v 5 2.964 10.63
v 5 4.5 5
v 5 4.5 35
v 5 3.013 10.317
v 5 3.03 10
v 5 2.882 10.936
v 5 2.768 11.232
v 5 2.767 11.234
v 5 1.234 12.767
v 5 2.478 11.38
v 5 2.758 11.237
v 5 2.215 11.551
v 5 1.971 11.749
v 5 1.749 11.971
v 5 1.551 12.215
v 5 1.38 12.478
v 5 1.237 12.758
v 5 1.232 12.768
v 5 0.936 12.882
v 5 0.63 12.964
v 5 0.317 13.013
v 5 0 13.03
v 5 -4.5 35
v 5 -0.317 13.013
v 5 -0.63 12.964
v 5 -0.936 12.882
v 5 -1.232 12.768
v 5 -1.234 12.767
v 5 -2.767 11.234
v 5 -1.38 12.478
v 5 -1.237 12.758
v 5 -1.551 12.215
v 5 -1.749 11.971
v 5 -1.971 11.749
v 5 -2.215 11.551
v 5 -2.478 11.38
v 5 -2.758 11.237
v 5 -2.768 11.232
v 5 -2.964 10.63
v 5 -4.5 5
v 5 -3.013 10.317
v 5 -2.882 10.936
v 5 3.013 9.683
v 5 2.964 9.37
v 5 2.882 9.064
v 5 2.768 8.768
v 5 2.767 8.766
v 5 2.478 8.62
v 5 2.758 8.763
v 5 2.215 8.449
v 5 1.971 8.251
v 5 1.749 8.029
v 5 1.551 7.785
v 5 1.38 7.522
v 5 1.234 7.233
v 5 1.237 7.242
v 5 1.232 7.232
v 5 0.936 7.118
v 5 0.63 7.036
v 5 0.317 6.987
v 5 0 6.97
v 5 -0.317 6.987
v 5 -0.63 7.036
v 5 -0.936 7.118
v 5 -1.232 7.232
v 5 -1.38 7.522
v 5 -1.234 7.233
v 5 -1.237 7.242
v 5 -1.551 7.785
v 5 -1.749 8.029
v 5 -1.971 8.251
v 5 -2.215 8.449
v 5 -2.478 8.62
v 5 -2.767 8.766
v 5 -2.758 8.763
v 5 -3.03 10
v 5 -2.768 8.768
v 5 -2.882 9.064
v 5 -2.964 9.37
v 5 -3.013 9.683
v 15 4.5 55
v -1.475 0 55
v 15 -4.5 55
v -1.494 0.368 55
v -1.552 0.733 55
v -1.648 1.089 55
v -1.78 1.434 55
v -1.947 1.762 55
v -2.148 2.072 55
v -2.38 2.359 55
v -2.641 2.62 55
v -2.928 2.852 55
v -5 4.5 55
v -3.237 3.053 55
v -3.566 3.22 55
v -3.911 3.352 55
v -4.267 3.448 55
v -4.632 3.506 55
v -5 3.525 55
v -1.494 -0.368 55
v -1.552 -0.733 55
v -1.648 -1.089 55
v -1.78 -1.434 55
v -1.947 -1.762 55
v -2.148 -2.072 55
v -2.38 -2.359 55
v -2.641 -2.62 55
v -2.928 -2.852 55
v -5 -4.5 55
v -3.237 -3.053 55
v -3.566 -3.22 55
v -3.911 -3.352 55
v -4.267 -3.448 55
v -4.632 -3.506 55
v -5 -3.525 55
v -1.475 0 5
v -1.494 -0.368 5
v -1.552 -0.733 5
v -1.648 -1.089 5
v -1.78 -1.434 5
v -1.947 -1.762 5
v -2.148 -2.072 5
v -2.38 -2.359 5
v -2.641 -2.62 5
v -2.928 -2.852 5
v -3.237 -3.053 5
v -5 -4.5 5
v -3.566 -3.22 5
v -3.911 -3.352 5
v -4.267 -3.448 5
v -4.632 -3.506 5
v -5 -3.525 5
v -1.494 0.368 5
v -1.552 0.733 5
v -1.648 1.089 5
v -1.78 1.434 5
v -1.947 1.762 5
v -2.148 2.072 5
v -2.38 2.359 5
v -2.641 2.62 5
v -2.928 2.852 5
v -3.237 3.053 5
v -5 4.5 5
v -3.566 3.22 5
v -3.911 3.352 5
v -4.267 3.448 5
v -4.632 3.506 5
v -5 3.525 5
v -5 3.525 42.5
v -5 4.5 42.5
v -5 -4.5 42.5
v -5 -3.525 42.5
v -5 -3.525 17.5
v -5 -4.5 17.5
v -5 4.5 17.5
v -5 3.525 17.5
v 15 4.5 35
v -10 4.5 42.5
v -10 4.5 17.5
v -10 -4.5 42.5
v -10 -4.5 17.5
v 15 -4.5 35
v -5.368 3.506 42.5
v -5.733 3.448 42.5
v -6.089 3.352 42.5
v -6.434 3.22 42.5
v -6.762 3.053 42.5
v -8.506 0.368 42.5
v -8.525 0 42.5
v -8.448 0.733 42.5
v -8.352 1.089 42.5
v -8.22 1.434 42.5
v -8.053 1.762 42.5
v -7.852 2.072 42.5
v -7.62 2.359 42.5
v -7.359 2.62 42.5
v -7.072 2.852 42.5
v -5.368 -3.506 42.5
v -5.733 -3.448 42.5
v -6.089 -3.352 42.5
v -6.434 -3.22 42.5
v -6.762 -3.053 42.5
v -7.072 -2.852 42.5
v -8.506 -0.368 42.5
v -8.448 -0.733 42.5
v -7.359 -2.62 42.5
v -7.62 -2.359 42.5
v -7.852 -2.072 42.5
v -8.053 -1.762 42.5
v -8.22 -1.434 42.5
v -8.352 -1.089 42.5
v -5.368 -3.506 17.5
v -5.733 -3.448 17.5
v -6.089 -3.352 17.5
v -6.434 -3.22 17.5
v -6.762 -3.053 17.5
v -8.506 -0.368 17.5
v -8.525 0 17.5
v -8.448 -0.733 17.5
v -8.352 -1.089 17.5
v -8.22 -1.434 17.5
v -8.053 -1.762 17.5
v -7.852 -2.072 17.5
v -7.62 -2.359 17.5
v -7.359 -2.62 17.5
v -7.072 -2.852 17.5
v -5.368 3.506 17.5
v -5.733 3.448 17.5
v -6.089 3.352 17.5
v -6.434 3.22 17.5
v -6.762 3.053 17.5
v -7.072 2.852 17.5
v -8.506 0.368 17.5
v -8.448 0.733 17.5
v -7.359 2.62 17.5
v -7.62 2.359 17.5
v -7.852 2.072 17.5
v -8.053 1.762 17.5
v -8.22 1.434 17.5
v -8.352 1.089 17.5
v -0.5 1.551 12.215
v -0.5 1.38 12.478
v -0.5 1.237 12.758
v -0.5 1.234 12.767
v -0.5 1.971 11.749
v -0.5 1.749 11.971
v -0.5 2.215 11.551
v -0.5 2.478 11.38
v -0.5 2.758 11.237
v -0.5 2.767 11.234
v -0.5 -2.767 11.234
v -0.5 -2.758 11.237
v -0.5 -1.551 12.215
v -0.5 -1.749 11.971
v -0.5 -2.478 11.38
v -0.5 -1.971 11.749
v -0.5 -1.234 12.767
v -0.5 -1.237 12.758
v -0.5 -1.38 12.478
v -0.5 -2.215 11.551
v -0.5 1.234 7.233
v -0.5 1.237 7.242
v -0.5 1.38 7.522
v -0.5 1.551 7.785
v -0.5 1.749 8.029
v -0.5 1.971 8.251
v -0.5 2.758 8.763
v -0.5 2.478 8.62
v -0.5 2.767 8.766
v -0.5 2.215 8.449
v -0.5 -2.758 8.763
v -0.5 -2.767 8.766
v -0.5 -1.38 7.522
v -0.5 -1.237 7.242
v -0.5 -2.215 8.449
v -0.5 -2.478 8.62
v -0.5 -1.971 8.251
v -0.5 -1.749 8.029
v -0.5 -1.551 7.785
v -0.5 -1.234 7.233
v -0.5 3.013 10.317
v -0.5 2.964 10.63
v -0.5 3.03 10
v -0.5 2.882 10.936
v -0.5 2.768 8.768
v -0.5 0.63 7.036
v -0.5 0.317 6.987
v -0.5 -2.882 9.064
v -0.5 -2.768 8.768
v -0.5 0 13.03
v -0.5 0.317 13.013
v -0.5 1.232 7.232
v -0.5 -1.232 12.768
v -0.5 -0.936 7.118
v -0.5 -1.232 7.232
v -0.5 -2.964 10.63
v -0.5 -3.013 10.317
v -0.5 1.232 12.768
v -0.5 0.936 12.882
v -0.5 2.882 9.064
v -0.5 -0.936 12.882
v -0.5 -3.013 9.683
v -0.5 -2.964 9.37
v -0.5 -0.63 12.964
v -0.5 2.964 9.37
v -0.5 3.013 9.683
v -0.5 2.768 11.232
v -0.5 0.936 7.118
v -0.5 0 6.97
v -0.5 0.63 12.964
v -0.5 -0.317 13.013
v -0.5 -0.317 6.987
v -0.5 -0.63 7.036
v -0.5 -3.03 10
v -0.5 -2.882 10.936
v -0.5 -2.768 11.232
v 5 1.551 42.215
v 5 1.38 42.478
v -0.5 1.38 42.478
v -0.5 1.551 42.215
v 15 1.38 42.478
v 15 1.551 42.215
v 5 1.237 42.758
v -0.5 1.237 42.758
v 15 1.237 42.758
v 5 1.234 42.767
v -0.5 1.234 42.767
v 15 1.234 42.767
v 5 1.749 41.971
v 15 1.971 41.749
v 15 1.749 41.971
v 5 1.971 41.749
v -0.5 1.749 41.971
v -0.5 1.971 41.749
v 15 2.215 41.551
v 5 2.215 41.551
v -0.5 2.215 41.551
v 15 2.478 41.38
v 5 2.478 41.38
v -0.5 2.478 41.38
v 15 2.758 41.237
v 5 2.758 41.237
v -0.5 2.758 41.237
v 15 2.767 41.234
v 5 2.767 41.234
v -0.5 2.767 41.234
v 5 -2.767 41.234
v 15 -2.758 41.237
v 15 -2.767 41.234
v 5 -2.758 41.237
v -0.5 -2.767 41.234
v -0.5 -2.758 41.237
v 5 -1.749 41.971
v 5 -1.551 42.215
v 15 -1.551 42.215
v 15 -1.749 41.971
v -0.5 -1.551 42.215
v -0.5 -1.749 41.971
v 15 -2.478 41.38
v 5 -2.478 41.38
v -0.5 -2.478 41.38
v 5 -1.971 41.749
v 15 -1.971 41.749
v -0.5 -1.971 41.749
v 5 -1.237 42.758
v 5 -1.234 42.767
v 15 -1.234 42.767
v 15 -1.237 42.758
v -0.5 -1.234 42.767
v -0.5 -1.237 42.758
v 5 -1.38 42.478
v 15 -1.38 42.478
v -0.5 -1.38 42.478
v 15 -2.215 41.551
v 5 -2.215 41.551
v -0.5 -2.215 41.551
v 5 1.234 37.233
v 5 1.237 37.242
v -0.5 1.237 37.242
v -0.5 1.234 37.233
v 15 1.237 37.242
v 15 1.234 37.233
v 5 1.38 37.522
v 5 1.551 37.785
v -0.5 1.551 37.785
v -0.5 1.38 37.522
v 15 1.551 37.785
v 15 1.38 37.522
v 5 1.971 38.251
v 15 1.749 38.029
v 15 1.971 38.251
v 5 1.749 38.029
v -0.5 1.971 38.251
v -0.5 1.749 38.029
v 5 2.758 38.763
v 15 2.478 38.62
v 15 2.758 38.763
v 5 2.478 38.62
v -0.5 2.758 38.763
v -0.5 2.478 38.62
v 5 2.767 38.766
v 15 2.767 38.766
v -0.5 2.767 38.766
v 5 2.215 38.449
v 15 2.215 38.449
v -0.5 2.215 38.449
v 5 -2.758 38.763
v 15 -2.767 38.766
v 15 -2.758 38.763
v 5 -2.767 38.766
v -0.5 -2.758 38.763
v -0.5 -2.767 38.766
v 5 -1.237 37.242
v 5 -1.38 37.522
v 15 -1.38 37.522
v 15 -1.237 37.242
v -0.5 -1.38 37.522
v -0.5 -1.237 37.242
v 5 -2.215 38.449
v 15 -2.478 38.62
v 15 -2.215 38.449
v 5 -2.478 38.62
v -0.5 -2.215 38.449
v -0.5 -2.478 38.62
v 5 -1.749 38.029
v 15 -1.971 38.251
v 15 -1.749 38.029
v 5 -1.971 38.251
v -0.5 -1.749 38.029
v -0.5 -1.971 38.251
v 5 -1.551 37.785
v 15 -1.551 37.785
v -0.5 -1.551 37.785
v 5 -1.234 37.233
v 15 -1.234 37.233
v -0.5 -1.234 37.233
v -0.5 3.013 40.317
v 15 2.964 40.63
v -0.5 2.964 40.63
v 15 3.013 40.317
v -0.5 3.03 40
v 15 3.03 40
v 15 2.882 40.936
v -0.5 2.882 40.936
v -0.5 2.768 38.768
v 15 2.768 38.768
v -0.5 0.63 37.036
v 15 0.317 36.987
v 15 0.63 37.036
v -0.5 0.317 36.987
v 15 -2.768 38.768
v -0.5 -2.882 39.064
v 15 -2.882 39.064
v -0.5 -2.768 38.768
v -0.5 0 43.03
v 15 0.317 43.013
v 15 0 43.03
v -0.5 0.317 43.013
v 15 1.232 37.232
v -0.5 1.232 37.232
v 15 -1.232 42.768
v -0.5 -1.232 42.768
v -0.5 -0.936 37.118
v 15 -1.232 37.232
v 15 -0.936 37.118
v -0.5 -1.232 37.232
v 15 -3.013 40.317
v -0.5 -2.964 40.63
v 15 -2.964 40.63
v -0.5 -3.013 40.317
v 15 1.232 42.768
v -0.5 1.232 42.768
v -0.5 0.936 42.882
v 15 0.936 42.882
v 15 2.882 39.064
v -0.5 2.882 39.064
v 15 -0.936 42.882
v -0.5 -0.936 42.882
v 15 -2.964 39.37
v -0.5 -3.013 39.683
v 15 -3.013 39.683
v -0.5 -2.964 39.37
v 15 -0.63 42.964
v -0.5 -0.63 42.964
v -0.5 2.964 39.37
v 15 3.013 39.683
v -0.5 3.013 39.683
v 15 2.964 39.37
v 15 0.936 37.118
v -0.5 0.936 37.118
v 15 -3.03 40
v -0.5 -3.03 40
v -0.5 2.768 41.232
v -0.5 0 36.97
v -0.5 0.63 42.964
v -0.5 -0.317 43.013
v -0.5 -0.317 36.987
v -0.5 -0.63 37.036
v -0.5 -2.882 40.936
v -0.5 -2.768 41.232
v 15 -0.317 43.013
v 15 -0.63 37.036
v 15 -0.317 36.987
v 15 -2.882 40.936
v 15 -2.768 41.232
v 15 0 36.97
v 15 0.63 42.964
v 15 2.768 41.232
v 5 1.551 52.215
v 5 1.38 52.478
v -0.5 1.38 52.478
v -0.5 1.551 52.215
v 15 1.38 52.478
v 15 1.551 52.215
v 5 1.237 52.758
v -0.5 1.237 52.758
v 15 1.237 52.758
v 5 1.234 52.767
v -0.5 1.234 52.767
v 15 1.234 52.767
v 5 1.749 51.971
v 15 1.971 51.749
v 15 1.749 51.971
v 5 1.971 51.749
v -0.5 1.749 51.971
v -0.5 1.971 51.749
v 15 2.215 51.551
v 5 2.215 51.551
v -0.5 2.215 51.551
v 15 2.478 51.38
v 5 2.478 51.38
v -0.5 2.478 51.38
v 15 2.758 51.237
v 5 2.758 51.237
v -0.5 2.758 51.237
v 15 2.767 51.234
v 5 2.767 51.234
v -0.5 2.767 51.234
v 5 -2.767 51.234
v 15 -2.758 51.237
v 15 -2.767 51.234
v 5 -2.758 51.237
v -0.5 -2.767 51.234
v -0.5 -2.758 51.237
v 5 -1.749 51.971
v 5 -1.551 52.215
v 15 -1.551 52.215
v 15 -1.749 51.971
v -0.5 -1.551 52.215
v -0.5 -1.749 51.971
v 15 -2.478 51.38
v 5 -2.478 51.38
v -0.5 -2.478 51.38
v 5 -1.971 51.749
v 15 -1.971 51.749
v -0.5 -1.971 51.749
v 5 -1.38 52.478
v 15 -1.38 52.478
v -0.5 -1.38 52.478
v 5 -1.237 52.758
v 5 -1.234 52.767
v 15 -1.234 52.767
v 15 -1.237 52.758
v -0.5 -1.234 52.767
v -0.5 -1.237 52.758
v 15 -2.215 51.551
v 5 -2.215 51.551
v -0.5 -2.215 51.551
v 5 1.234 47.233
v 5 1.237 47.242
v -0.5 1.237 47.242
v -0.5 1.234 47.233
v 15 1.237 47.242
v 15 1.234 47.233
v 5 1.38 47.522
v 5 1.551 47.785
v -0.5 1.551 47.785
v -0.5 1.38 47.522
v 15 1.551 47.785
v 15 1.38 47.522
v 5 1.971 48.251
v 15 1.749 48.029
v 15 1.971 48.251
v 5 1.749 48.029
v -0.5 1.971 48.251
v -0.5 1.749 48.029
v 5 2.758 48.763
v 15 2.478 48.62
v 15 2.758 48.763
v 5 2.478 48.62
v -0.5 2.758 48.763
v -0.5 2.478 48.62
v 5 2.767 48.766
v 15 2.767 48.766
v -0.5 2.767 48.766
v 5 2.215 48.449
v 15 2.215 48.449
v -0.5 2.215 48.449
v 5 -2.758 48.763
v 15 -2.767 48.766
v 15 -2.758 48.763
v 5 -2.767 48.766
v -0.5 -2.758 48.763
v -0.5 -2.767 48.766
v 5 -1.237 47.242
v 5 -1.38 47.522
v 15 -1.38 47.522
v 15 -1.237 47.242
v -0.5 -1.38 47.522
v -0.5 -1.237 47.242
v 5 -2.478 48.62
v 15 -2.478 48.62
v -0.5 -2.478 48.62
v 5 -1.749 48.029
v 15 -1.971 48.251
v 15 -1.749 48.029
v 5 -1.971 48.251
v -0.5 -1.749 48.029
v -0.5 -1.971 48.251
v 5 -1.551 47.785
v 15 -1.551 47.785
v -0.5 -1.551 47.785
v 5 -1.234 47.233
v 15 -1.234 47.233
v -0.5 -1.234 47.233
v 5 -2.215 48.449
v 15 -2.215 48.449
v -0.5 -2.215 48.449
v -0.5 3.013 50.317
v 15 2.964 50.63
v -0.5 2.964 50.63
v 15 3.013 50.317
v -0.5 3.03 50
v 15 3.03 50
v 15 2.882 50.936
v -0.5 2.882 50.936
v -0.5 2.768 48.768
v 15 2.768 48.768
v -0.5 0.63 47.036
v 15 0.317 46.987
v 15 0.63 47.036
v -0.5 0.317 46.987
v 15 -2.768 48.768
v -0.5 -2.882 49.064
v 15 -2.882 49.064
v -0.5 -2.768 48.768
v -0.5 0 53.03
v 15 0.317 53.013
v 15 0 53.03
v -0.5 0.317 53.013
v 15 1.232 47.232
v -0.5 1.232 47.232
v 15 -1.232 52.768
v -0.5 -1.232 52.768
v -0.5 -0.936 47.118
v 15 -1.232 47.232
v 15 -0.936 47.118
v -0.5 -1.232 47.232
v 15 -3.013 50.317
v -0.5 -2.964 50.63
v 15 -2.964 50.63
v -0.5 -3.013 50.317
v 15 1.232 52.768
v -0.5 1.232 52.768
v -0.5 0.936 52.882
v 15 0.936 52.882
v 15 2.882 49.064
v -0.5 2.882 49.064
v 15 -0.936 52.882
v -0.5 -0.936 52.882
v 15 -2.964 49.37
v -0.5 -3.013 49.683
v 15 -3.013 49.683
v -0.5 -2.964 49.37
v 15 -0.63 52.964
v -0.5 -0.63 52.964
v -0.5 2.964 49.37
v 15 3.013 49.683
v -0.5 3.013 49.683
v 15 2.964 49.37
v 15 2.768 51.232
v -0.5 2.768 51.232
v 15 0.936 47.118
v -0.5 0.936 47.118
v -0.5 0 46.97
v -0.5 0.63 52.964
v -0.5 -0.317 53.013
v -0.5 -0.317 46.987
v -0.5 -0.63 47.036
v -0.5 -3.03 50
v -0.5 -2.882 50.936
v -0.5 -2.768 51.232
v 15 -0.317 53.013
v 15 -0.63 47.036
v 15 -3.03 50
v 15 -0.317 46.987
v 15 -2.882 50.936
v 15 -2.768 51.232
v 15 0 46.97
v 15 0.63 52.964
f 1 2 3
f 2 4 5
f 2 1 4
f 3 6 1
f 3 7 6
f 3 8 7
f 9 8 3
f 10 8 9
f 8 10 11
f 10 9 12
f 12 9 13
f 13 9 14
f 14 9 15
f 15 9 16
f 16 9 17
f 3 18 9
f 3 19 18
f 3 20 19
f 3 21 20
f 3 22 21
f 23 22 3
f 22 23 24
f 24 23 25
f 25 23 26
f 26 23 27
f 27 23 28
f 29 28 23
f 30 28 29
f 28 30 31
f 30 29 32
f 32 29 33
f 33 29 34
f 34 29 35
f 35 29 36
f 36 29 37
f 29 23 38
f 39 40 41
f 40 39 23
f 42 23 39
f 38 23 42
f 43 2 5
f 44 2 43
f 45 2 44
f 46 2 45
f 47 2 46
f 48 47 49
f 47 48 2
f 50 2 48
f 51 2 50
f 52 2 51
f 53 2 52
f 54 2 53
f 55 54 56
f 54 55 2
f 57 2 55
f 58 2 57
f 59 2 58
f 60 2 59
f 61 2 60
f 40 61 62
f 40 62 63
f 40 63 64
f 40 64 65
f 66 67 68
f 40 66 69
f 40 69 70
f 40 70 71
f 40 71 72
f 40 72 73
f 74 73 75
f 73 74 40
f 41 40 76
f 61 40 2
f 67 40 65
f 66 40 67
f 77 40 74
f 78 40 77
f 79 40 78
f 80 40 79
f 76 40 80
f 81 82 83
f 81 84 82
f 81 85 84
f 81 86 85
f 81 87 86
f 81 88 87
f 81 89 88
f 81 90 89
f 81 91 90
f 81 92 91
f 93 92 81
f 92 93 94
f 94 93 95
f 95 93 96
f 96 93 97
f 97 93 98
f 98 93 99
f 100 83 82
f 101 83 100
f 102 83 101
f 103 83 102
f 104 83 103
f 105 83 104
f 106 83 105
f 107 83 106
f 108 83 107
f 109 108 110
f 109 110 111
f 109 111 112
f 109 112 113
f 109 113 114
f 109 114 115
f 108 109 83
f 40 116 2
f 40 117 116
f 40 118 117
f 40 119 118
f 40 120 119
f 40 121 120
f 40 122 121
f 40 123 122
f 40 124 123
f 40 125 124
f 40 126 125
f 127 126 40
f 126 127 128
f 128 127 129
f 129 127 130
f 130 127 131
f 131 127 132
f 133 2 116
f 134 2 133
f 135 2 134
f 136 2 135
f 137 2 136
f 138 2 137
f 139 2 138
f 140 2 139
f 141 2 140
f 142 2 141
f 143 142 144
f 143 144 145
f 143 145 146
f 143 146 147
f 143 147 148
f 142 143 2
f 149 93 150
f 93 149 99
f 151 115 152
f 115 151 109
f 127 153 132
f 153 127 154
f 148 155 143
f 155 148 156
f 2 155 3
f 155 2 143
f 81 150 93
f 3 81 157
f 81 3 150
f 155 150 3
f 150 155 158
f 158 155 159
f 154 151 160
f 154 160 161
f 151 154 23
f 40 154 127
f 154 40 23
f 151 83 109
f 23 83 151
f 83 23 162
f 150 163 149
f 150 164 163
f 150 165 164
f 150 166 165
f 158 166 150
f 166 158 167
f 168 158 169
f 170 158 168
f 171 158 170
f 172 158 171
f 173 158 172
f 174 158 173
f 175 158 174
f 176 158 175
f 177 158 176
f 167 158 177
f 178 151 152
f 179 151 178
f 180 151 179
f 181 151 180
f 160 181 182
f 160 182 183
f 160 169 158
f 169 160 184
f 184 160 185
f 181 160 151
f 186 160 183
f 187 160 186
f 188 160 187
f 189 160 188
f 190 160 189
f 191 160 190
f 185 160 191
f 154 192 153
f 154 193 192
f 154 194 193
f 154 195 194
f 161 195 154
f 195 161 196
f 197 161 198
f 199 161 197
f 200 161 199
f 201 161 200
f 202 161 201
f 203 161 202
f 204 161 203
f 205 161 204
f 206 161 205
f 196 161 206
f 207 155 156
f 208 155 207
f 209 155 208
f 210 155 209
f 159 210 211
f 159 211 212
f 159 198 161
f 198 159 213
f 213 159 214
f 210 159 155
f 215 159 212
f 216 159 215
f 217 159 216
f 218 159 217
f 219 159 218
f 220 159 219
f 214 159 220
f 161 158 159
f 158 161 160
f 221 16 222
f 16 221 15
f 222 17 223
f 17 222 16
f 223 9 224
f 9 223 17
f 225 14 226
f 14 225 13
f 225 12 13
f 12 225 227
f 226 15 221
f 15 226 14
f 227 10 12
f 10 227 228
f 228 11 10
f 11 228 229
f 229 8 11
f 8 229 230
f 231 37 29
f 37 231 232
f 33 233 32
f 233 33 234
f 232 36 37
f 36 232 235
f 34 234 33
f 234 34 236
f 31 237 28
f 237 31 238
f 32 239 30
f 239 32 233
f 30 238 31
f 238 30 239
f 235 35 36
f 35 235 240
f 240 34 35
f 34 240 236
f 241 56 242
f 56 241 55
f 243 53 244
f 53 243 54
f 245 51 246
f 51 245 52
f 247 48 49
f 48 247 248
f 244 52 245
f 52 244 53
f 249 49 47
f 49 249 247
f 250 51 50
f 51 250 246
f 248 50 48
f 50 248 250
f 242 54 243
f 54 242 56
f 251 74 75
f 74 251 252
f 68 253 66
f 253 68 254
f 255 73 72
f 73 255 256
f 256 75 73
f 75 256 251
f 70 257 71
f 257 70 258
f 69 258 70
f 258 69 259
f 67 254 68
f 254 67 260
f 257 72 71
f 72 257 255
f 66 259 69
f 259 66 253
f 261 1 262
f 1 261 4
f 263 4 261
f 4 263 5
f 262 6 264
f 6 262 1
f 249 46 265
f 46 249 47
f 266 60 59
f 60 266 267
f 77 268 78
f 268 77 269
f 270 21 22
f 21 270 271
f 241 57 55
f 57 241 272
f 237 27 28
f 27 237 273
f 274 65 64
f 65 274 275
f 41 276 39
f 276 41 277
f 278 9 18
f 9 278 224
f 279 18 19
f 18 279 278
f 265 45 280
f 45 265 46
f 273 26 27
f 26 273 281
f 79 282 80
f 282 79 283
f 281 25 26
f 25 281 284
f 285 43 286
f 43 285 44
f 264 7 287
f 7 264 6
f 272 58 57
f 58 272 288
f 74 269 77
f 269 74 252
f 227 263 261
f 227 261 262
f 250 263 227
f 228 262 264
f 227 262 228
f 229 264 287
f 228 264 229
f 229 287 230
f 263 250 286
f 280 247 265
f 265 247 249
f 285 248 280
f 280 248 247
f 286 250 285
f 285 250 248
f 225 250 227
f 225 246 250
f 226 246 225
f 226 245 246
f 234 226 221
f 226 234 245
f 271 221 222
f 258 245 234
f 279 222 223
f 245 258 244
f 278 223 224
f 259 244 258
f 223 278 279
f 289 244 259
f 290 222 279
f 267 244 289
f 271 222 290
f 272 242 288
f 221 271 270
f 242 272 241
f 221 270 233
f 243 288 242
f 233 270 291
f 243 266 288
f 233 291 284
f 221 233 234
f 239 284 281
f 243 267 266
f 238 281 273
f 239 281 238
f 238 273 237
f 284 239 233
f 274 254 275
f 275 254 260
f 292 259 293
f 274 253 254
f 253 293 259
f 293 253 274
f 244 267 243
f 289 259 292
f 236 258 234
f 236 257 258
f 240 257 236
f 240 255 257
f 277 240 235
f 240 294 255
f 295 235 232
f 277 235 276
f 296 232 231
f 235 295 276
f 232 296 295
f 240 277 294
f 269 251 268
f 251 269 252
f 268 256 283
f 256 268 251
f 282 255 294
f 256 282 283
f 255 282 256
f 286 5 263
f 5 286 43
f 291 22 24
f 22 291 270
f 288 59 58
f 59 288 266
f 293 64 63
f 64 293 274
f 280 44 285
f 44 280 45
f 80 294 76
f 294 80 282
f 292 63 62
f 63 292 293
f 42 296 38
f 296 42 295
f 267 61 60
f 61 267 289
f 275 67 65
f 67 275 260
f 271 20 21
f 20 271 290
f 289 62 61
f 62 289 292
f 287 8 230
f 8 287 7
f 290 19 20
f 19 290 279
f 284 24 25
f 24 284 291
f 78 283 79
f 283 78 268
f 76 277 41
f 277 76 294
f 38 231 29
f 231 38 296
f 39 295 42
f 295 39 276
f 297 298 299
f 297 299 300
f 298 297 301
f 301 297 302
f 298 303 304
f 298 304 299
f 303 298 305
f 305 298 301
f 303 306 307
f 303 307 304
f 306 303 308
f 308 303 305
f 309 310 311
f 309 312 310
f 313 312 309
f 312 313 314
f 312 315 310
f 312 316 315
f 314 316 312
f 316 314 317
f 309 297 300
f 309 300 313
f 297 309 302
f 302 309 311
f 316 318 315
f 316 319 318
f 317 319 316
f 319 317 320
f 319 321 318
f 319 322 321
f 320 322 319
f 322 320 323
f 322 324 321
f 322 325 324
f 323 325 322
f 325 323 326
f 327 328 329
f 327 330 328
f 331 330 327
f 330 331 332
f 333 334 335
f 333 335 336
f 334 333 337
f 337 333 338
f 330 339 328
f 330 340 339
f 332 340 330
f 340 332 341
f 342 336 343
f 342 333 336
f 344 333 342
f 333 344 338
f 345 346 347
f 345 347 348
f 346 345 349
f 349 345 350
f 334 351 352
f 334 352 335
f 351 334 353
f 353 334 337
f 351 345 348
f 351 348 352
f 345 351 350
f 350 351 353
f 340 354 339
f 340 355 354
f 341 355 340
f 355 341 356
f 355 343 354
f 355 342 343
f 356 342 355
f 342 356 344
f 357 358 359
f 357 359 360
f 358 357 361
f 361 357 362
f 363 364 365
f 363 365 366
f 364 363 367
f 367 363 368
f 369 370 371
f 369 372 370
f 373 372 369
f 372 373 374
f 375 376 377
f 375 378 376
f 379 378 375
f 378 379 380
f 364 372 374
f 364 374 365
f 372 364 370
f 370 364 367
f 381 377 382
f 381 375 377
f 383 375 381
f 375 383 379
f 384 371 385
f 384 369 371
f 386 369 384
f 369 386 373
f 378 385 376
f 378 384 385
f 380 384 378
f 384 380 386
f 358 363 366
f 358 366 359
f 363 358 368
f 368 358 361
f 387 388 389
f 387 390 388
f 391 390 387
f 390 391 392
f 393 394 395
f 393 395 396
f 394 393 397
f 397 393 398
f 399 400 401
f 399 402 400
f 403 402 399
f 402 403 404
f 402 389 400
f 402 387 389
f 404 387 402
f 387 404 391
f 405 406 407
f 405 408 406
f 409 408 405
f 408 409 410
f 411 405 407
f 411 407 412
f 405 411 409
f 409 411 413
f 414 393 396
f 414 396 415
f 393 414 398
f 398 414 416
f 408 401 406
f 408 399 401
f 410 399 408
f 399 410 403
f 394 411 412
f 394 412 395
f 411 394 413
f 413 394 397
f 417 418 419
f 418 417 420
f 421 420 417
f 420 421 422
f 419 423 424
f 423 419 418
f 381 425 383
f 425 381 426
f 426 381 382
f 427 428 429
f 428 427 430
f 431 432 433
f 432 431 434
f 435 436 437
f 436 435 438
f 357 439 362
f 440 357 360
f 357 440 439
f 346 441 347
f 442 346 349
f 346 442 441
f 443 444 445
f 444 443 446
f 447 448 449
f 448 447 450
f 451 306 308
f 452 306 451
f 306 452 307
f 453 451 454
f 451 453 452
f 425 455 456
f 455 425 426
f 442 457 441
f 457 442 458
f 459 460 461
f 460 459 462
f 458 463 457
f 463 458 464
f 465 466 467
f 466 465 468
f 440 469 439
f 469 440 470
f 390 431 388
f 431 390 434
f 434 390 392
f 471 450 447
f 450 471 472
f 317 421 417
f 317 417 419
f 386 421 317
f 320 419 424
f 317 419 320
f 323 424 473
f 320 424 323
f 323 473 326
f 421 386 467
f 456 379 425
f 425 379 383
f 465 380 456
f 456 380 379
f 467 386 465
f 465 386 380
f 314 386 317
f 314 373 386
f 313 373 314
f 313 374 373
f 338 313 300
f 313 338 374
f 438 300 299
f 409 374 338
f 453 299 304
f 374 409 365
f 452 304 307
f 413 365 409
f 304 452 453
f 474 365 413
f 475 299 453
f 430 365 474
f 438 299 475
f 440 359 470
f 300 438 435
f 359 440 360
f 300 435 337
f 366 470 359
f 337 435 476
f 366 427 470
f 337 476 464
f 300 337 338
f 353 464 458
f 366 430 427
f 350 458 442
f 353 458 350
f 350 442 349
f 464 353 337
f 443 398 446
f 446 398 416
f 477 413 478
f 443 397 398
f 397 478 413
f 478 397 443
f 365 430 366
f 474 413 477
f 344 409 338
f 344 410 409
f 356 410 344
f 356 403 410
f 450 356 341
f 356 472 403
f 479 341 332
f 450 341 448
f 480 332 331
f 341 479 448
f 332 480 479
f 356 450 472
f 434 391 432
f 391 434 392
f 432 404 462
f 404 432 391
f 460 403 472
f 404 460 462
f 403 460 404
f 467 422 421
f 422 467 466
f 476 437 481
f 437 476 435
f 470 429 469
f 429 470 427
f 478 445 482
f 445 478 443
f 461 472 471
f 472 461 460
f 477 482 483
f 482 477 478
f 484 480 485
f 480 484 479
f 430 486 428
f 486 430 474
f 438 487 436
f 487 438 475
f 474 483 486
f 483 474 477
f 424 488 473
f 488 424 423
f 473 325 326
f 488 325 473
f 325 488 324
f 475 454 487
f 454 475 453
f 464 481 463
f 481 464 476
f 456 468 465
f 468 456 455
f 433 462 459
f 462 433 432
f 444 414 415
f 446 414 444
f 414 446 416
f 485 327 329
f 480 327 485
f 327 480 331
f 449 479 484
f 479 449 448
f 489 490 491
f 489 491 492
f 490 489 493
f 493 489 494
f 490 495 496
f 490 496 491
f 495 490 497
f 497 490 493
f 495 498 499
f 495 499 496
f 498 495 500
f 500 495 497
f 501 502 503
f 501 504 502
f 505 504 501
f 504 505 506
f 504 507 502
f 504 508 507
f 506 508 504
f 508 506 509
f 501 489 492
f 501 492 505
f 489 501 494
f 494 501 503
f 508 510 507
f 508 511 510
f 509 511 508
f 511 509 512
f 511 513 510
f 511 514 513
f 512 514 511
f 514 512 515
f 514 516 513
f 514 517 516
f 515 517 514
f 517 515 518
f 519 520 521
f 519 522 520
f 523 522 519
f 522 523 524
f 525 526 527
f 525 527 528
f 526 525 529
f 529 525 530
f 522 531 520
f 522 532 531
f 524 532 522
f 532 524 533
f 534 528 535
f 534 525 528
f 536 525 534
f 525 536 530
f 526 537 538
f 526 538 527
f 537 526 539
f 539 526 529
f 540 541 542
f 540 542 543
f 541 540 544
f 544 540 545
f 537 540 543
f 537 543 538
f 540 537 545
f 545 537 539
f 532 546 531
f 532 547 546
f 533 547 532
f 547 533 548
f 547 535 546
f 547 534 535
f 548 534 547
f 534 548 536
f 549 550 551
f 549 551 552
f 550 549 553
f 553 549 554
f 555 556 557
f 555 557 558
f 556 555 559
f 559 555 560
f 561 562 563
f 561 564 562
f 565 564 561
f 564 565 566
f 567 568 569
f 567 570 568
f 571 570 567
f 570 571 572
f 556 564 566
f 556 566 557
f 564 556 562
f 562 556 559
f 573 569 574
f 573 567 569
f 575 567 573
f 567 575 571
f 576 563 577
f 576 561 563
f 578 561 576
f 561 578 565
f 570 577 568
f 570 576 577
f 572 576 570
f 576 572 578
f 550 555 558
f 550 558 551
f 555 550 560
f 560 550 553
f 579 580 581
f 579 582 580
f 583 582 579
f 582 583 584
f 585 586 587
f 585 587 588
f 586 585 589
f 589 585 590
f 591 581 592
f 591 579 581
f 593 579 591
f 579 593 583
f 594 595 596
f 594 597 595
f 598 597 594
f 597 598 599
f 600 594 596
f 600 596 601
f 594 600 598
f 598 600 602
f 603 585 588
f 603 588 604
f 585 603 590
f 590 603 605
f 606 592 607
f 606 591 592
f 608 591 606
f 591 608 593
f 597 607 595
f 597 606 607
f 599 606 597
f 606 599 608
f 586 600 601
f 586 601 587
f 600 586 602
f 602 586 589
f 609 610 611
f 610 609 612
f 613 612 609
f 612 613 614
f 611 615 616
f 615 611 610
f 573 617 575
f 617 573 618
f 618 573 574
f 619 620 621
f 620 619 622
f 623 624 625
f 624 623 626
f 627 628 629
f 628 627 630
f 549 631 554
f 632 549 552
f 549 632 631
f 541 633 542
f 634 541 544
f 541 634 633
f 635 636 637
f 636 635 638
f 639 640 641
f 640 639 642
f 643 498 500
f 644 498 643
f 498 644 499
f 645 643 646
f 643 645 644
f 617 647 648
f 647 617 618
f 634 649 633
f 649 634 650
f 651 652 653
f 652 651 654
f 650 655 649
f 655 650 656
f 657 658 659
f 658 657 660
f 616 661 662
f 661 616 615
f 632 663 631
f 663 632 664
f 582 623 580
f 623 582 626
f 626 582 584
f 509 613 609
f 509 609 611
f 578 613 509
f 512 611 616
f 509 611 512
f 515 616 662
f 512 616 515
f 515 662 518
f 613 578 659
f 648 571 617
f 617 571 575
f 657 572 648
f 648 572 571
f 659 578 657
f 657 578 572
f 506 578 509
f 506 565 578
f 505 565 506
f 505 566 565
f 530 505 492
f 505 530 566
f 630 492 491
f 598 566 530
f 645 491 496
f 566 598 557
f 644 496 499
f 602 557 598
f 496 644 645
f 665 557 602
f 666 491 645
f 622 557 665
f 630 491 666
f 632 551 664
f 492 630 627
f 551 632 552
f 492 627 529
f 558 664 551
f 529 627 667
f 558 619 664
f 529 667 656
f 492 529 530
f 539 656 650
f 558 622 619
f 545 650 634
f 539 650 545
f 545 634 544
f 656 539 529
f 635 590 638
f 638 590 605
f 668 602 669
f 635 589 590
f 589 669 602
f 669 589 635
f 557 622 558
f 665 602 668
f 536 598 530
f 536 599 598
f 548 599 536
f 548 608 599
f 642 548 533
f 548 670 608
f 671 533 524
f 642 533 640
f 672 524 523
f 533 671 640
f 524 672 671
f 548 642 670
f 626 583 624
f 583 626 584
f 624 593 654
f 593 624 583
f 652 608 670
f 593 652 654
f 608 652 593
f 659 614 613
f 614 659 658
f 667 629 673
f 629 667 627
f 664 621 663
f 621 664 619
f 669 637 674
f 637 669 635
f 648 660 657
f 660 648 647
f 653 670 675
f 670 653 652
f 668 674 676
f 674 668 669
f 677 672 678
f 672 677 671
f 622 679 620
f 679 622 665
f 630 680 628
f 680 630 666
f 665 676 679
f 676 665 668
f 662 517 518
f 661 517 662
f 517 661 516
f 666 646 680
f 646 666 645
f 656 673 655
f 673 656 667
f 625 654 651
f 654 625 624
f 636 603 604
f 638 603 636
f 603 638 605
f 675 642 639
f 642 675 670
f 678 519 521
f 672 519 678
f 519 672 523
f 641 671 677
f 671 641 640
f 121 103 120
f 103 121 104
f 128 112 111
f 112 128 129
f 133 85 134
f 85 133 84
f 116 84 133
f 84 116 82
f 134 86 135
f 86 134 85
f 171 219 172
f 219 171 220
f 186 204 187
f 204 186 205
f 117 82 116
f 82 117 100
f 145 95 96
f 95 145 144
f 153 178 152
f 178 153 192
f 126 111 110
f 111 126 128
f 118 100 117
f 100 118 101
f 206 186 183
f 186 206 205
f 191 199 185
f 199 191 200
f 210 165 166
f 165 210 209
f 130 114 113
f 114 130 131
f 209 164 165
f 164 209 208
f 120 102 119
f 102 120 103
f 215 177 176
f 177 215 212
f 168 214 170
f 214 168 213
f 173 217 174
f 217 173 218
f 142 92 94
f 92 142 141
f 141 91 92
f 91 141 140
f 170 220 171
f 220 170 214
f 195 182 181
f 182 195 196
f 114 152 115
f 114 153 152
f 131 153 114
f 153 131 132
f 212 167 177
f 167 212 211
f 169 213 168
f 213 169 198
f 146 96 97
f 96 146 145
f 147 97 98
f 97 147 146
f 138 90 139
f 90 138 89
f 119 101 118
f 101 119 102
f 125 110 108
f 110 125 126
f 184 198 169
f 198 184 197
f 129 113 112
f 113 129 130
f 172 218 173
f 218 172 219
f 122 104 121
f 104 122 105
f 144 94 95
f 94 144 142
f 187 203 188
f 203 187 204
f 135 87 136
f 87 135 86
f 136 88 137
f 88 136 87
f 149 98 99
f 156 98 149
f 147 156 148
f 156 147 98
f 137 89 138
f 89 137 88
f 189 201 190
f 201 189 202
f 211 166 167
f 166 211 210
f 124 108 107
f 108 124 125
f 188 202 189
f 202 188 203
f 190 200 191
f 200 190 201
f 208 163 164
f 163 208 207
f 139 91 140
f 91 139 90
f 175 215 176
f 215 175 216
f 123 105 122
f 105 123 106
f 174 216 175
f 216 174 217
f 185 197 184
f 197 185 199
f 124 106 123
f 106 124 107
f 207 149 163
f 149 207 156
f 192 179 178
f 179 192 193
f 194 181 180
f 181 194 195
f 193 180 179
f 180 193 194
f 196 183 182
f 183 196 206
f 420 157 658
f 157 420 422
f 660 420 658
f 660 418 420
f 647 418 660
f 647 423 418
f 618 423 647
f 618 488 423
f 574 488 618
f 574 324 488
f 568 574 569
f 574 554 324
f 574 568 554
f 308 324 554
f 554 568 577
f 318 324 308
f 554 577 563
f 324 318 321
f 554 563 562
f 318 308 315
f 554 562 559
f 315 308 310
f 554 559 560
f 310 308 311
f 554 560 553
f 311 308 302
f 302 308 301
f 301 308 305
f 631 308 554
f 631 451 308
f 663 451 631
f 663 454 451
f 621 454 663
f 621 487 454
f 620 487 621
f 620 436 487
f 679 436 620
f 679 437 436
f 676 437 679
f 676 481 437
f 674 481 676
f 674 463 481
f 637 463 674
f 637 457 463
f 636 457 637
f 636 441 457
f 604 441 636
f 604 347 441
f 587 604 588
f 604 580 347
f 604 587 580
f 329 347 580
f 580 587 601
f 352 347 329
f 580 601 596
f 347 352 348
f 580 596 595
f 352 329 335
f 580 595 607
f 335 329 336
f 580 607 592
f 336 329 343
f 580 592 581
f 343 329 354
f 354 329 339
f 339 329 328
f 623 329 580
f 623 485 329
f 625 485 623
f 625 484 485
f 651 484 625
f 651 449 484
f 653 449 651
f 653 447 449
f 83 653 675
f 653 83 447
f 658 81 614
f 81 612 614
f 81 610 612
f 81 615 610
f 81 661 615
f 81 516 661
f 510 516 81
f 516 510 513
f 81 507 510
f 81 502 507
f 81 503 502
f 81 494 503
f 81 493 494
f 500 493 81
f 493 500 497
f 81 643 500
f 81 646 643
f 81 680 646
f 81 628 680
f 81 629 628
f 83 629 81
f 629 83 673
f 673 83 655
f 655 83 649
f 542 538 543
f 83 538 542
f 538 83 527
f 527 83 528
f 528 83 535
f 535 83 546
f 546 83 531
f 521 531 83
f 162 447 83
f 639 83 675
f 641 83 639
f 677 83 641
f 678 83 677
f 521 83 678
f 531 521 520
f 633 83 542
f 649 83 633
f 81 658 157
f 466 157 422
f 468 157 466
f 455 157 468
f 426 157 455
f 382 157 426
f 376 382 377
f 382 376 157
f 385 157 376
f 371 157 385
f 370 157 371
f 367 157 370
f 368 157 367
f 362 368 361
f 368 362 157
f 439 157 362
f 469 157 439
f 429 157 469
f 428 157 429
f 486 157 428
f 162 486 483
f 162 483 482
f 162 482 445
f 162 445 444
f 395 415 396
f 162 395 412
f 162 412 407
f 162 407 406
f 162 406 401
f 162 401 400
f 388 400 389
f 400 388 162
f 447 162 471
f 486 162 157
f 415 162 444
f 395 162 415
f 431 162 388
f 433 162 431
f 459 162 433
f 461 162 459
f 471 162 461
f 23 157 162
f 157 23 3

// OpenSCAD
// ---------------CHANGEABLE VARIABLES---------------

//Step Stats
step_width = 20;
step_length_x = 20;

//Bars
bar_r = 5;
joint_bar_r = bar_r*0.6;

//Joint
joint_cube = [bar_r*6, bar_r*2, bar_r*2];
joint_l = step_width+joint_cube[1]*1.1;

//Cube
cube_length = bar_r*2;

//Ball bearing in diameter
bearing = 6.95;

//Indents
indent_dis_joint = joint_bar_r*1.3;


// ---------------MODULE SHAPES---------------

module small_bar(c, x_offset, y_offset, z_offset, length, rotation, hole){
    difference(){
        // Checking if the radius should be a for a hole or a bar
        // radius = hole ? joint_bar_r*1.05 : joint_bar_r; // ORIGINAL
        radius = hole ? joint_bar_r*1.01 : joint_bar_r; // THIGHTER
        
        // Making the main bar
        translate([x_offset, y_offset, z_offset])
            color(c)rotate(a = rotation)cylinder(r=radius, h=length, $fn=60, center=true);
        
        // Checking which axis the indents should be along, 
        // and sending is as the offset_push variable when making the indents in the bar.
        if(rotation[0] == 0 && rotation[1] == 0){
            indents(c, x_offset, y_offset, z_offset, length, rotation, hole, offset_push=[1,2,0]);
        } else if(rotation[0] == rotation[2]){
            indents(c, x_offset, y_offset, z_offset, length, rotation, hole, offset_push=[0,1,2]);
        } else {
            indents(c, x_offset, y_offset, z_offset, length, rotation, hole, offset_push=[1,0,2]);
        }
    }
}

module indents(c, x_offset, y_offset, z_offset, length, rotation, hole, offset_push){
    // The Indents on the side
    indent_dis = hole ? indent_dis_joint*1.02 : indent_dis_joint;
    k = indent_dis;
    x_push = offset_push[0];
    y_push = offset_push[1];
    z_push = offset_push[2];
    for(j = [[0,k,k],[0,-k,k],[0,k,-k],[0,-k,-k]]){
        translate([x_offset+j[x_push], y_offset+j[y_push], z_offset+j[z_push]])
        color(c)rotate(a = rotation)cylinder(r=joint_bar_r, h=length*2, $fn=60, center=true);
    }
}

// ---------------OBEJCT CODE---------------


//Red-Green cube
difference(){
    union(){
    // Red Cube
    translate([0, 0, joint_cube[2]*3])
        color("red")cube([cube_length, step_width-joint_cube[1]-1, bar_r*10], center=true);
    //Green cube - Hvis den skal beefes op, fjern 0.5 i cube_length og sæt *2 i -bar_r
    translate([-bar_r*1.5, 0, joint_cube[2]*3])
        color("green")cube([cube_length*0.5, step_width-joint_cube[1]-1, bar_r*5], center=true);
    }    
    //Indents
    for(h = [joint_cube[2],joint_cube[2]*4, joint_cube[2]*5]){
        small_bar("yellow", bar_r*6.1, 0, h, joint_l*2, [90,0,90], hole = true);
    }
    translate([-bar_r, 0, 0]) //sæt evt -bar_r*2 hvis hul skal være i grøn cube kun, men så skal bredden på grøn beefes lidt op
        cylinder(d=bearing+0.1, h=joint_l*10, $fn=60, center=true);
}


//Grey Cube
difference(){
    translate([cube_length/2+bar_r,0,joint_cube[2]*4.5])
        color("grey")cube([bar_r*2, step_width-joint_cube[1]-1, joint_cube[2]*2], center=true);
    for(h = [joint_cube[2]*4, joint_cube[2]*5]){
        small_bar("yellow", 0, 0, h, joint_l*2, [90,0,90], hole = true);
    }
}
       
